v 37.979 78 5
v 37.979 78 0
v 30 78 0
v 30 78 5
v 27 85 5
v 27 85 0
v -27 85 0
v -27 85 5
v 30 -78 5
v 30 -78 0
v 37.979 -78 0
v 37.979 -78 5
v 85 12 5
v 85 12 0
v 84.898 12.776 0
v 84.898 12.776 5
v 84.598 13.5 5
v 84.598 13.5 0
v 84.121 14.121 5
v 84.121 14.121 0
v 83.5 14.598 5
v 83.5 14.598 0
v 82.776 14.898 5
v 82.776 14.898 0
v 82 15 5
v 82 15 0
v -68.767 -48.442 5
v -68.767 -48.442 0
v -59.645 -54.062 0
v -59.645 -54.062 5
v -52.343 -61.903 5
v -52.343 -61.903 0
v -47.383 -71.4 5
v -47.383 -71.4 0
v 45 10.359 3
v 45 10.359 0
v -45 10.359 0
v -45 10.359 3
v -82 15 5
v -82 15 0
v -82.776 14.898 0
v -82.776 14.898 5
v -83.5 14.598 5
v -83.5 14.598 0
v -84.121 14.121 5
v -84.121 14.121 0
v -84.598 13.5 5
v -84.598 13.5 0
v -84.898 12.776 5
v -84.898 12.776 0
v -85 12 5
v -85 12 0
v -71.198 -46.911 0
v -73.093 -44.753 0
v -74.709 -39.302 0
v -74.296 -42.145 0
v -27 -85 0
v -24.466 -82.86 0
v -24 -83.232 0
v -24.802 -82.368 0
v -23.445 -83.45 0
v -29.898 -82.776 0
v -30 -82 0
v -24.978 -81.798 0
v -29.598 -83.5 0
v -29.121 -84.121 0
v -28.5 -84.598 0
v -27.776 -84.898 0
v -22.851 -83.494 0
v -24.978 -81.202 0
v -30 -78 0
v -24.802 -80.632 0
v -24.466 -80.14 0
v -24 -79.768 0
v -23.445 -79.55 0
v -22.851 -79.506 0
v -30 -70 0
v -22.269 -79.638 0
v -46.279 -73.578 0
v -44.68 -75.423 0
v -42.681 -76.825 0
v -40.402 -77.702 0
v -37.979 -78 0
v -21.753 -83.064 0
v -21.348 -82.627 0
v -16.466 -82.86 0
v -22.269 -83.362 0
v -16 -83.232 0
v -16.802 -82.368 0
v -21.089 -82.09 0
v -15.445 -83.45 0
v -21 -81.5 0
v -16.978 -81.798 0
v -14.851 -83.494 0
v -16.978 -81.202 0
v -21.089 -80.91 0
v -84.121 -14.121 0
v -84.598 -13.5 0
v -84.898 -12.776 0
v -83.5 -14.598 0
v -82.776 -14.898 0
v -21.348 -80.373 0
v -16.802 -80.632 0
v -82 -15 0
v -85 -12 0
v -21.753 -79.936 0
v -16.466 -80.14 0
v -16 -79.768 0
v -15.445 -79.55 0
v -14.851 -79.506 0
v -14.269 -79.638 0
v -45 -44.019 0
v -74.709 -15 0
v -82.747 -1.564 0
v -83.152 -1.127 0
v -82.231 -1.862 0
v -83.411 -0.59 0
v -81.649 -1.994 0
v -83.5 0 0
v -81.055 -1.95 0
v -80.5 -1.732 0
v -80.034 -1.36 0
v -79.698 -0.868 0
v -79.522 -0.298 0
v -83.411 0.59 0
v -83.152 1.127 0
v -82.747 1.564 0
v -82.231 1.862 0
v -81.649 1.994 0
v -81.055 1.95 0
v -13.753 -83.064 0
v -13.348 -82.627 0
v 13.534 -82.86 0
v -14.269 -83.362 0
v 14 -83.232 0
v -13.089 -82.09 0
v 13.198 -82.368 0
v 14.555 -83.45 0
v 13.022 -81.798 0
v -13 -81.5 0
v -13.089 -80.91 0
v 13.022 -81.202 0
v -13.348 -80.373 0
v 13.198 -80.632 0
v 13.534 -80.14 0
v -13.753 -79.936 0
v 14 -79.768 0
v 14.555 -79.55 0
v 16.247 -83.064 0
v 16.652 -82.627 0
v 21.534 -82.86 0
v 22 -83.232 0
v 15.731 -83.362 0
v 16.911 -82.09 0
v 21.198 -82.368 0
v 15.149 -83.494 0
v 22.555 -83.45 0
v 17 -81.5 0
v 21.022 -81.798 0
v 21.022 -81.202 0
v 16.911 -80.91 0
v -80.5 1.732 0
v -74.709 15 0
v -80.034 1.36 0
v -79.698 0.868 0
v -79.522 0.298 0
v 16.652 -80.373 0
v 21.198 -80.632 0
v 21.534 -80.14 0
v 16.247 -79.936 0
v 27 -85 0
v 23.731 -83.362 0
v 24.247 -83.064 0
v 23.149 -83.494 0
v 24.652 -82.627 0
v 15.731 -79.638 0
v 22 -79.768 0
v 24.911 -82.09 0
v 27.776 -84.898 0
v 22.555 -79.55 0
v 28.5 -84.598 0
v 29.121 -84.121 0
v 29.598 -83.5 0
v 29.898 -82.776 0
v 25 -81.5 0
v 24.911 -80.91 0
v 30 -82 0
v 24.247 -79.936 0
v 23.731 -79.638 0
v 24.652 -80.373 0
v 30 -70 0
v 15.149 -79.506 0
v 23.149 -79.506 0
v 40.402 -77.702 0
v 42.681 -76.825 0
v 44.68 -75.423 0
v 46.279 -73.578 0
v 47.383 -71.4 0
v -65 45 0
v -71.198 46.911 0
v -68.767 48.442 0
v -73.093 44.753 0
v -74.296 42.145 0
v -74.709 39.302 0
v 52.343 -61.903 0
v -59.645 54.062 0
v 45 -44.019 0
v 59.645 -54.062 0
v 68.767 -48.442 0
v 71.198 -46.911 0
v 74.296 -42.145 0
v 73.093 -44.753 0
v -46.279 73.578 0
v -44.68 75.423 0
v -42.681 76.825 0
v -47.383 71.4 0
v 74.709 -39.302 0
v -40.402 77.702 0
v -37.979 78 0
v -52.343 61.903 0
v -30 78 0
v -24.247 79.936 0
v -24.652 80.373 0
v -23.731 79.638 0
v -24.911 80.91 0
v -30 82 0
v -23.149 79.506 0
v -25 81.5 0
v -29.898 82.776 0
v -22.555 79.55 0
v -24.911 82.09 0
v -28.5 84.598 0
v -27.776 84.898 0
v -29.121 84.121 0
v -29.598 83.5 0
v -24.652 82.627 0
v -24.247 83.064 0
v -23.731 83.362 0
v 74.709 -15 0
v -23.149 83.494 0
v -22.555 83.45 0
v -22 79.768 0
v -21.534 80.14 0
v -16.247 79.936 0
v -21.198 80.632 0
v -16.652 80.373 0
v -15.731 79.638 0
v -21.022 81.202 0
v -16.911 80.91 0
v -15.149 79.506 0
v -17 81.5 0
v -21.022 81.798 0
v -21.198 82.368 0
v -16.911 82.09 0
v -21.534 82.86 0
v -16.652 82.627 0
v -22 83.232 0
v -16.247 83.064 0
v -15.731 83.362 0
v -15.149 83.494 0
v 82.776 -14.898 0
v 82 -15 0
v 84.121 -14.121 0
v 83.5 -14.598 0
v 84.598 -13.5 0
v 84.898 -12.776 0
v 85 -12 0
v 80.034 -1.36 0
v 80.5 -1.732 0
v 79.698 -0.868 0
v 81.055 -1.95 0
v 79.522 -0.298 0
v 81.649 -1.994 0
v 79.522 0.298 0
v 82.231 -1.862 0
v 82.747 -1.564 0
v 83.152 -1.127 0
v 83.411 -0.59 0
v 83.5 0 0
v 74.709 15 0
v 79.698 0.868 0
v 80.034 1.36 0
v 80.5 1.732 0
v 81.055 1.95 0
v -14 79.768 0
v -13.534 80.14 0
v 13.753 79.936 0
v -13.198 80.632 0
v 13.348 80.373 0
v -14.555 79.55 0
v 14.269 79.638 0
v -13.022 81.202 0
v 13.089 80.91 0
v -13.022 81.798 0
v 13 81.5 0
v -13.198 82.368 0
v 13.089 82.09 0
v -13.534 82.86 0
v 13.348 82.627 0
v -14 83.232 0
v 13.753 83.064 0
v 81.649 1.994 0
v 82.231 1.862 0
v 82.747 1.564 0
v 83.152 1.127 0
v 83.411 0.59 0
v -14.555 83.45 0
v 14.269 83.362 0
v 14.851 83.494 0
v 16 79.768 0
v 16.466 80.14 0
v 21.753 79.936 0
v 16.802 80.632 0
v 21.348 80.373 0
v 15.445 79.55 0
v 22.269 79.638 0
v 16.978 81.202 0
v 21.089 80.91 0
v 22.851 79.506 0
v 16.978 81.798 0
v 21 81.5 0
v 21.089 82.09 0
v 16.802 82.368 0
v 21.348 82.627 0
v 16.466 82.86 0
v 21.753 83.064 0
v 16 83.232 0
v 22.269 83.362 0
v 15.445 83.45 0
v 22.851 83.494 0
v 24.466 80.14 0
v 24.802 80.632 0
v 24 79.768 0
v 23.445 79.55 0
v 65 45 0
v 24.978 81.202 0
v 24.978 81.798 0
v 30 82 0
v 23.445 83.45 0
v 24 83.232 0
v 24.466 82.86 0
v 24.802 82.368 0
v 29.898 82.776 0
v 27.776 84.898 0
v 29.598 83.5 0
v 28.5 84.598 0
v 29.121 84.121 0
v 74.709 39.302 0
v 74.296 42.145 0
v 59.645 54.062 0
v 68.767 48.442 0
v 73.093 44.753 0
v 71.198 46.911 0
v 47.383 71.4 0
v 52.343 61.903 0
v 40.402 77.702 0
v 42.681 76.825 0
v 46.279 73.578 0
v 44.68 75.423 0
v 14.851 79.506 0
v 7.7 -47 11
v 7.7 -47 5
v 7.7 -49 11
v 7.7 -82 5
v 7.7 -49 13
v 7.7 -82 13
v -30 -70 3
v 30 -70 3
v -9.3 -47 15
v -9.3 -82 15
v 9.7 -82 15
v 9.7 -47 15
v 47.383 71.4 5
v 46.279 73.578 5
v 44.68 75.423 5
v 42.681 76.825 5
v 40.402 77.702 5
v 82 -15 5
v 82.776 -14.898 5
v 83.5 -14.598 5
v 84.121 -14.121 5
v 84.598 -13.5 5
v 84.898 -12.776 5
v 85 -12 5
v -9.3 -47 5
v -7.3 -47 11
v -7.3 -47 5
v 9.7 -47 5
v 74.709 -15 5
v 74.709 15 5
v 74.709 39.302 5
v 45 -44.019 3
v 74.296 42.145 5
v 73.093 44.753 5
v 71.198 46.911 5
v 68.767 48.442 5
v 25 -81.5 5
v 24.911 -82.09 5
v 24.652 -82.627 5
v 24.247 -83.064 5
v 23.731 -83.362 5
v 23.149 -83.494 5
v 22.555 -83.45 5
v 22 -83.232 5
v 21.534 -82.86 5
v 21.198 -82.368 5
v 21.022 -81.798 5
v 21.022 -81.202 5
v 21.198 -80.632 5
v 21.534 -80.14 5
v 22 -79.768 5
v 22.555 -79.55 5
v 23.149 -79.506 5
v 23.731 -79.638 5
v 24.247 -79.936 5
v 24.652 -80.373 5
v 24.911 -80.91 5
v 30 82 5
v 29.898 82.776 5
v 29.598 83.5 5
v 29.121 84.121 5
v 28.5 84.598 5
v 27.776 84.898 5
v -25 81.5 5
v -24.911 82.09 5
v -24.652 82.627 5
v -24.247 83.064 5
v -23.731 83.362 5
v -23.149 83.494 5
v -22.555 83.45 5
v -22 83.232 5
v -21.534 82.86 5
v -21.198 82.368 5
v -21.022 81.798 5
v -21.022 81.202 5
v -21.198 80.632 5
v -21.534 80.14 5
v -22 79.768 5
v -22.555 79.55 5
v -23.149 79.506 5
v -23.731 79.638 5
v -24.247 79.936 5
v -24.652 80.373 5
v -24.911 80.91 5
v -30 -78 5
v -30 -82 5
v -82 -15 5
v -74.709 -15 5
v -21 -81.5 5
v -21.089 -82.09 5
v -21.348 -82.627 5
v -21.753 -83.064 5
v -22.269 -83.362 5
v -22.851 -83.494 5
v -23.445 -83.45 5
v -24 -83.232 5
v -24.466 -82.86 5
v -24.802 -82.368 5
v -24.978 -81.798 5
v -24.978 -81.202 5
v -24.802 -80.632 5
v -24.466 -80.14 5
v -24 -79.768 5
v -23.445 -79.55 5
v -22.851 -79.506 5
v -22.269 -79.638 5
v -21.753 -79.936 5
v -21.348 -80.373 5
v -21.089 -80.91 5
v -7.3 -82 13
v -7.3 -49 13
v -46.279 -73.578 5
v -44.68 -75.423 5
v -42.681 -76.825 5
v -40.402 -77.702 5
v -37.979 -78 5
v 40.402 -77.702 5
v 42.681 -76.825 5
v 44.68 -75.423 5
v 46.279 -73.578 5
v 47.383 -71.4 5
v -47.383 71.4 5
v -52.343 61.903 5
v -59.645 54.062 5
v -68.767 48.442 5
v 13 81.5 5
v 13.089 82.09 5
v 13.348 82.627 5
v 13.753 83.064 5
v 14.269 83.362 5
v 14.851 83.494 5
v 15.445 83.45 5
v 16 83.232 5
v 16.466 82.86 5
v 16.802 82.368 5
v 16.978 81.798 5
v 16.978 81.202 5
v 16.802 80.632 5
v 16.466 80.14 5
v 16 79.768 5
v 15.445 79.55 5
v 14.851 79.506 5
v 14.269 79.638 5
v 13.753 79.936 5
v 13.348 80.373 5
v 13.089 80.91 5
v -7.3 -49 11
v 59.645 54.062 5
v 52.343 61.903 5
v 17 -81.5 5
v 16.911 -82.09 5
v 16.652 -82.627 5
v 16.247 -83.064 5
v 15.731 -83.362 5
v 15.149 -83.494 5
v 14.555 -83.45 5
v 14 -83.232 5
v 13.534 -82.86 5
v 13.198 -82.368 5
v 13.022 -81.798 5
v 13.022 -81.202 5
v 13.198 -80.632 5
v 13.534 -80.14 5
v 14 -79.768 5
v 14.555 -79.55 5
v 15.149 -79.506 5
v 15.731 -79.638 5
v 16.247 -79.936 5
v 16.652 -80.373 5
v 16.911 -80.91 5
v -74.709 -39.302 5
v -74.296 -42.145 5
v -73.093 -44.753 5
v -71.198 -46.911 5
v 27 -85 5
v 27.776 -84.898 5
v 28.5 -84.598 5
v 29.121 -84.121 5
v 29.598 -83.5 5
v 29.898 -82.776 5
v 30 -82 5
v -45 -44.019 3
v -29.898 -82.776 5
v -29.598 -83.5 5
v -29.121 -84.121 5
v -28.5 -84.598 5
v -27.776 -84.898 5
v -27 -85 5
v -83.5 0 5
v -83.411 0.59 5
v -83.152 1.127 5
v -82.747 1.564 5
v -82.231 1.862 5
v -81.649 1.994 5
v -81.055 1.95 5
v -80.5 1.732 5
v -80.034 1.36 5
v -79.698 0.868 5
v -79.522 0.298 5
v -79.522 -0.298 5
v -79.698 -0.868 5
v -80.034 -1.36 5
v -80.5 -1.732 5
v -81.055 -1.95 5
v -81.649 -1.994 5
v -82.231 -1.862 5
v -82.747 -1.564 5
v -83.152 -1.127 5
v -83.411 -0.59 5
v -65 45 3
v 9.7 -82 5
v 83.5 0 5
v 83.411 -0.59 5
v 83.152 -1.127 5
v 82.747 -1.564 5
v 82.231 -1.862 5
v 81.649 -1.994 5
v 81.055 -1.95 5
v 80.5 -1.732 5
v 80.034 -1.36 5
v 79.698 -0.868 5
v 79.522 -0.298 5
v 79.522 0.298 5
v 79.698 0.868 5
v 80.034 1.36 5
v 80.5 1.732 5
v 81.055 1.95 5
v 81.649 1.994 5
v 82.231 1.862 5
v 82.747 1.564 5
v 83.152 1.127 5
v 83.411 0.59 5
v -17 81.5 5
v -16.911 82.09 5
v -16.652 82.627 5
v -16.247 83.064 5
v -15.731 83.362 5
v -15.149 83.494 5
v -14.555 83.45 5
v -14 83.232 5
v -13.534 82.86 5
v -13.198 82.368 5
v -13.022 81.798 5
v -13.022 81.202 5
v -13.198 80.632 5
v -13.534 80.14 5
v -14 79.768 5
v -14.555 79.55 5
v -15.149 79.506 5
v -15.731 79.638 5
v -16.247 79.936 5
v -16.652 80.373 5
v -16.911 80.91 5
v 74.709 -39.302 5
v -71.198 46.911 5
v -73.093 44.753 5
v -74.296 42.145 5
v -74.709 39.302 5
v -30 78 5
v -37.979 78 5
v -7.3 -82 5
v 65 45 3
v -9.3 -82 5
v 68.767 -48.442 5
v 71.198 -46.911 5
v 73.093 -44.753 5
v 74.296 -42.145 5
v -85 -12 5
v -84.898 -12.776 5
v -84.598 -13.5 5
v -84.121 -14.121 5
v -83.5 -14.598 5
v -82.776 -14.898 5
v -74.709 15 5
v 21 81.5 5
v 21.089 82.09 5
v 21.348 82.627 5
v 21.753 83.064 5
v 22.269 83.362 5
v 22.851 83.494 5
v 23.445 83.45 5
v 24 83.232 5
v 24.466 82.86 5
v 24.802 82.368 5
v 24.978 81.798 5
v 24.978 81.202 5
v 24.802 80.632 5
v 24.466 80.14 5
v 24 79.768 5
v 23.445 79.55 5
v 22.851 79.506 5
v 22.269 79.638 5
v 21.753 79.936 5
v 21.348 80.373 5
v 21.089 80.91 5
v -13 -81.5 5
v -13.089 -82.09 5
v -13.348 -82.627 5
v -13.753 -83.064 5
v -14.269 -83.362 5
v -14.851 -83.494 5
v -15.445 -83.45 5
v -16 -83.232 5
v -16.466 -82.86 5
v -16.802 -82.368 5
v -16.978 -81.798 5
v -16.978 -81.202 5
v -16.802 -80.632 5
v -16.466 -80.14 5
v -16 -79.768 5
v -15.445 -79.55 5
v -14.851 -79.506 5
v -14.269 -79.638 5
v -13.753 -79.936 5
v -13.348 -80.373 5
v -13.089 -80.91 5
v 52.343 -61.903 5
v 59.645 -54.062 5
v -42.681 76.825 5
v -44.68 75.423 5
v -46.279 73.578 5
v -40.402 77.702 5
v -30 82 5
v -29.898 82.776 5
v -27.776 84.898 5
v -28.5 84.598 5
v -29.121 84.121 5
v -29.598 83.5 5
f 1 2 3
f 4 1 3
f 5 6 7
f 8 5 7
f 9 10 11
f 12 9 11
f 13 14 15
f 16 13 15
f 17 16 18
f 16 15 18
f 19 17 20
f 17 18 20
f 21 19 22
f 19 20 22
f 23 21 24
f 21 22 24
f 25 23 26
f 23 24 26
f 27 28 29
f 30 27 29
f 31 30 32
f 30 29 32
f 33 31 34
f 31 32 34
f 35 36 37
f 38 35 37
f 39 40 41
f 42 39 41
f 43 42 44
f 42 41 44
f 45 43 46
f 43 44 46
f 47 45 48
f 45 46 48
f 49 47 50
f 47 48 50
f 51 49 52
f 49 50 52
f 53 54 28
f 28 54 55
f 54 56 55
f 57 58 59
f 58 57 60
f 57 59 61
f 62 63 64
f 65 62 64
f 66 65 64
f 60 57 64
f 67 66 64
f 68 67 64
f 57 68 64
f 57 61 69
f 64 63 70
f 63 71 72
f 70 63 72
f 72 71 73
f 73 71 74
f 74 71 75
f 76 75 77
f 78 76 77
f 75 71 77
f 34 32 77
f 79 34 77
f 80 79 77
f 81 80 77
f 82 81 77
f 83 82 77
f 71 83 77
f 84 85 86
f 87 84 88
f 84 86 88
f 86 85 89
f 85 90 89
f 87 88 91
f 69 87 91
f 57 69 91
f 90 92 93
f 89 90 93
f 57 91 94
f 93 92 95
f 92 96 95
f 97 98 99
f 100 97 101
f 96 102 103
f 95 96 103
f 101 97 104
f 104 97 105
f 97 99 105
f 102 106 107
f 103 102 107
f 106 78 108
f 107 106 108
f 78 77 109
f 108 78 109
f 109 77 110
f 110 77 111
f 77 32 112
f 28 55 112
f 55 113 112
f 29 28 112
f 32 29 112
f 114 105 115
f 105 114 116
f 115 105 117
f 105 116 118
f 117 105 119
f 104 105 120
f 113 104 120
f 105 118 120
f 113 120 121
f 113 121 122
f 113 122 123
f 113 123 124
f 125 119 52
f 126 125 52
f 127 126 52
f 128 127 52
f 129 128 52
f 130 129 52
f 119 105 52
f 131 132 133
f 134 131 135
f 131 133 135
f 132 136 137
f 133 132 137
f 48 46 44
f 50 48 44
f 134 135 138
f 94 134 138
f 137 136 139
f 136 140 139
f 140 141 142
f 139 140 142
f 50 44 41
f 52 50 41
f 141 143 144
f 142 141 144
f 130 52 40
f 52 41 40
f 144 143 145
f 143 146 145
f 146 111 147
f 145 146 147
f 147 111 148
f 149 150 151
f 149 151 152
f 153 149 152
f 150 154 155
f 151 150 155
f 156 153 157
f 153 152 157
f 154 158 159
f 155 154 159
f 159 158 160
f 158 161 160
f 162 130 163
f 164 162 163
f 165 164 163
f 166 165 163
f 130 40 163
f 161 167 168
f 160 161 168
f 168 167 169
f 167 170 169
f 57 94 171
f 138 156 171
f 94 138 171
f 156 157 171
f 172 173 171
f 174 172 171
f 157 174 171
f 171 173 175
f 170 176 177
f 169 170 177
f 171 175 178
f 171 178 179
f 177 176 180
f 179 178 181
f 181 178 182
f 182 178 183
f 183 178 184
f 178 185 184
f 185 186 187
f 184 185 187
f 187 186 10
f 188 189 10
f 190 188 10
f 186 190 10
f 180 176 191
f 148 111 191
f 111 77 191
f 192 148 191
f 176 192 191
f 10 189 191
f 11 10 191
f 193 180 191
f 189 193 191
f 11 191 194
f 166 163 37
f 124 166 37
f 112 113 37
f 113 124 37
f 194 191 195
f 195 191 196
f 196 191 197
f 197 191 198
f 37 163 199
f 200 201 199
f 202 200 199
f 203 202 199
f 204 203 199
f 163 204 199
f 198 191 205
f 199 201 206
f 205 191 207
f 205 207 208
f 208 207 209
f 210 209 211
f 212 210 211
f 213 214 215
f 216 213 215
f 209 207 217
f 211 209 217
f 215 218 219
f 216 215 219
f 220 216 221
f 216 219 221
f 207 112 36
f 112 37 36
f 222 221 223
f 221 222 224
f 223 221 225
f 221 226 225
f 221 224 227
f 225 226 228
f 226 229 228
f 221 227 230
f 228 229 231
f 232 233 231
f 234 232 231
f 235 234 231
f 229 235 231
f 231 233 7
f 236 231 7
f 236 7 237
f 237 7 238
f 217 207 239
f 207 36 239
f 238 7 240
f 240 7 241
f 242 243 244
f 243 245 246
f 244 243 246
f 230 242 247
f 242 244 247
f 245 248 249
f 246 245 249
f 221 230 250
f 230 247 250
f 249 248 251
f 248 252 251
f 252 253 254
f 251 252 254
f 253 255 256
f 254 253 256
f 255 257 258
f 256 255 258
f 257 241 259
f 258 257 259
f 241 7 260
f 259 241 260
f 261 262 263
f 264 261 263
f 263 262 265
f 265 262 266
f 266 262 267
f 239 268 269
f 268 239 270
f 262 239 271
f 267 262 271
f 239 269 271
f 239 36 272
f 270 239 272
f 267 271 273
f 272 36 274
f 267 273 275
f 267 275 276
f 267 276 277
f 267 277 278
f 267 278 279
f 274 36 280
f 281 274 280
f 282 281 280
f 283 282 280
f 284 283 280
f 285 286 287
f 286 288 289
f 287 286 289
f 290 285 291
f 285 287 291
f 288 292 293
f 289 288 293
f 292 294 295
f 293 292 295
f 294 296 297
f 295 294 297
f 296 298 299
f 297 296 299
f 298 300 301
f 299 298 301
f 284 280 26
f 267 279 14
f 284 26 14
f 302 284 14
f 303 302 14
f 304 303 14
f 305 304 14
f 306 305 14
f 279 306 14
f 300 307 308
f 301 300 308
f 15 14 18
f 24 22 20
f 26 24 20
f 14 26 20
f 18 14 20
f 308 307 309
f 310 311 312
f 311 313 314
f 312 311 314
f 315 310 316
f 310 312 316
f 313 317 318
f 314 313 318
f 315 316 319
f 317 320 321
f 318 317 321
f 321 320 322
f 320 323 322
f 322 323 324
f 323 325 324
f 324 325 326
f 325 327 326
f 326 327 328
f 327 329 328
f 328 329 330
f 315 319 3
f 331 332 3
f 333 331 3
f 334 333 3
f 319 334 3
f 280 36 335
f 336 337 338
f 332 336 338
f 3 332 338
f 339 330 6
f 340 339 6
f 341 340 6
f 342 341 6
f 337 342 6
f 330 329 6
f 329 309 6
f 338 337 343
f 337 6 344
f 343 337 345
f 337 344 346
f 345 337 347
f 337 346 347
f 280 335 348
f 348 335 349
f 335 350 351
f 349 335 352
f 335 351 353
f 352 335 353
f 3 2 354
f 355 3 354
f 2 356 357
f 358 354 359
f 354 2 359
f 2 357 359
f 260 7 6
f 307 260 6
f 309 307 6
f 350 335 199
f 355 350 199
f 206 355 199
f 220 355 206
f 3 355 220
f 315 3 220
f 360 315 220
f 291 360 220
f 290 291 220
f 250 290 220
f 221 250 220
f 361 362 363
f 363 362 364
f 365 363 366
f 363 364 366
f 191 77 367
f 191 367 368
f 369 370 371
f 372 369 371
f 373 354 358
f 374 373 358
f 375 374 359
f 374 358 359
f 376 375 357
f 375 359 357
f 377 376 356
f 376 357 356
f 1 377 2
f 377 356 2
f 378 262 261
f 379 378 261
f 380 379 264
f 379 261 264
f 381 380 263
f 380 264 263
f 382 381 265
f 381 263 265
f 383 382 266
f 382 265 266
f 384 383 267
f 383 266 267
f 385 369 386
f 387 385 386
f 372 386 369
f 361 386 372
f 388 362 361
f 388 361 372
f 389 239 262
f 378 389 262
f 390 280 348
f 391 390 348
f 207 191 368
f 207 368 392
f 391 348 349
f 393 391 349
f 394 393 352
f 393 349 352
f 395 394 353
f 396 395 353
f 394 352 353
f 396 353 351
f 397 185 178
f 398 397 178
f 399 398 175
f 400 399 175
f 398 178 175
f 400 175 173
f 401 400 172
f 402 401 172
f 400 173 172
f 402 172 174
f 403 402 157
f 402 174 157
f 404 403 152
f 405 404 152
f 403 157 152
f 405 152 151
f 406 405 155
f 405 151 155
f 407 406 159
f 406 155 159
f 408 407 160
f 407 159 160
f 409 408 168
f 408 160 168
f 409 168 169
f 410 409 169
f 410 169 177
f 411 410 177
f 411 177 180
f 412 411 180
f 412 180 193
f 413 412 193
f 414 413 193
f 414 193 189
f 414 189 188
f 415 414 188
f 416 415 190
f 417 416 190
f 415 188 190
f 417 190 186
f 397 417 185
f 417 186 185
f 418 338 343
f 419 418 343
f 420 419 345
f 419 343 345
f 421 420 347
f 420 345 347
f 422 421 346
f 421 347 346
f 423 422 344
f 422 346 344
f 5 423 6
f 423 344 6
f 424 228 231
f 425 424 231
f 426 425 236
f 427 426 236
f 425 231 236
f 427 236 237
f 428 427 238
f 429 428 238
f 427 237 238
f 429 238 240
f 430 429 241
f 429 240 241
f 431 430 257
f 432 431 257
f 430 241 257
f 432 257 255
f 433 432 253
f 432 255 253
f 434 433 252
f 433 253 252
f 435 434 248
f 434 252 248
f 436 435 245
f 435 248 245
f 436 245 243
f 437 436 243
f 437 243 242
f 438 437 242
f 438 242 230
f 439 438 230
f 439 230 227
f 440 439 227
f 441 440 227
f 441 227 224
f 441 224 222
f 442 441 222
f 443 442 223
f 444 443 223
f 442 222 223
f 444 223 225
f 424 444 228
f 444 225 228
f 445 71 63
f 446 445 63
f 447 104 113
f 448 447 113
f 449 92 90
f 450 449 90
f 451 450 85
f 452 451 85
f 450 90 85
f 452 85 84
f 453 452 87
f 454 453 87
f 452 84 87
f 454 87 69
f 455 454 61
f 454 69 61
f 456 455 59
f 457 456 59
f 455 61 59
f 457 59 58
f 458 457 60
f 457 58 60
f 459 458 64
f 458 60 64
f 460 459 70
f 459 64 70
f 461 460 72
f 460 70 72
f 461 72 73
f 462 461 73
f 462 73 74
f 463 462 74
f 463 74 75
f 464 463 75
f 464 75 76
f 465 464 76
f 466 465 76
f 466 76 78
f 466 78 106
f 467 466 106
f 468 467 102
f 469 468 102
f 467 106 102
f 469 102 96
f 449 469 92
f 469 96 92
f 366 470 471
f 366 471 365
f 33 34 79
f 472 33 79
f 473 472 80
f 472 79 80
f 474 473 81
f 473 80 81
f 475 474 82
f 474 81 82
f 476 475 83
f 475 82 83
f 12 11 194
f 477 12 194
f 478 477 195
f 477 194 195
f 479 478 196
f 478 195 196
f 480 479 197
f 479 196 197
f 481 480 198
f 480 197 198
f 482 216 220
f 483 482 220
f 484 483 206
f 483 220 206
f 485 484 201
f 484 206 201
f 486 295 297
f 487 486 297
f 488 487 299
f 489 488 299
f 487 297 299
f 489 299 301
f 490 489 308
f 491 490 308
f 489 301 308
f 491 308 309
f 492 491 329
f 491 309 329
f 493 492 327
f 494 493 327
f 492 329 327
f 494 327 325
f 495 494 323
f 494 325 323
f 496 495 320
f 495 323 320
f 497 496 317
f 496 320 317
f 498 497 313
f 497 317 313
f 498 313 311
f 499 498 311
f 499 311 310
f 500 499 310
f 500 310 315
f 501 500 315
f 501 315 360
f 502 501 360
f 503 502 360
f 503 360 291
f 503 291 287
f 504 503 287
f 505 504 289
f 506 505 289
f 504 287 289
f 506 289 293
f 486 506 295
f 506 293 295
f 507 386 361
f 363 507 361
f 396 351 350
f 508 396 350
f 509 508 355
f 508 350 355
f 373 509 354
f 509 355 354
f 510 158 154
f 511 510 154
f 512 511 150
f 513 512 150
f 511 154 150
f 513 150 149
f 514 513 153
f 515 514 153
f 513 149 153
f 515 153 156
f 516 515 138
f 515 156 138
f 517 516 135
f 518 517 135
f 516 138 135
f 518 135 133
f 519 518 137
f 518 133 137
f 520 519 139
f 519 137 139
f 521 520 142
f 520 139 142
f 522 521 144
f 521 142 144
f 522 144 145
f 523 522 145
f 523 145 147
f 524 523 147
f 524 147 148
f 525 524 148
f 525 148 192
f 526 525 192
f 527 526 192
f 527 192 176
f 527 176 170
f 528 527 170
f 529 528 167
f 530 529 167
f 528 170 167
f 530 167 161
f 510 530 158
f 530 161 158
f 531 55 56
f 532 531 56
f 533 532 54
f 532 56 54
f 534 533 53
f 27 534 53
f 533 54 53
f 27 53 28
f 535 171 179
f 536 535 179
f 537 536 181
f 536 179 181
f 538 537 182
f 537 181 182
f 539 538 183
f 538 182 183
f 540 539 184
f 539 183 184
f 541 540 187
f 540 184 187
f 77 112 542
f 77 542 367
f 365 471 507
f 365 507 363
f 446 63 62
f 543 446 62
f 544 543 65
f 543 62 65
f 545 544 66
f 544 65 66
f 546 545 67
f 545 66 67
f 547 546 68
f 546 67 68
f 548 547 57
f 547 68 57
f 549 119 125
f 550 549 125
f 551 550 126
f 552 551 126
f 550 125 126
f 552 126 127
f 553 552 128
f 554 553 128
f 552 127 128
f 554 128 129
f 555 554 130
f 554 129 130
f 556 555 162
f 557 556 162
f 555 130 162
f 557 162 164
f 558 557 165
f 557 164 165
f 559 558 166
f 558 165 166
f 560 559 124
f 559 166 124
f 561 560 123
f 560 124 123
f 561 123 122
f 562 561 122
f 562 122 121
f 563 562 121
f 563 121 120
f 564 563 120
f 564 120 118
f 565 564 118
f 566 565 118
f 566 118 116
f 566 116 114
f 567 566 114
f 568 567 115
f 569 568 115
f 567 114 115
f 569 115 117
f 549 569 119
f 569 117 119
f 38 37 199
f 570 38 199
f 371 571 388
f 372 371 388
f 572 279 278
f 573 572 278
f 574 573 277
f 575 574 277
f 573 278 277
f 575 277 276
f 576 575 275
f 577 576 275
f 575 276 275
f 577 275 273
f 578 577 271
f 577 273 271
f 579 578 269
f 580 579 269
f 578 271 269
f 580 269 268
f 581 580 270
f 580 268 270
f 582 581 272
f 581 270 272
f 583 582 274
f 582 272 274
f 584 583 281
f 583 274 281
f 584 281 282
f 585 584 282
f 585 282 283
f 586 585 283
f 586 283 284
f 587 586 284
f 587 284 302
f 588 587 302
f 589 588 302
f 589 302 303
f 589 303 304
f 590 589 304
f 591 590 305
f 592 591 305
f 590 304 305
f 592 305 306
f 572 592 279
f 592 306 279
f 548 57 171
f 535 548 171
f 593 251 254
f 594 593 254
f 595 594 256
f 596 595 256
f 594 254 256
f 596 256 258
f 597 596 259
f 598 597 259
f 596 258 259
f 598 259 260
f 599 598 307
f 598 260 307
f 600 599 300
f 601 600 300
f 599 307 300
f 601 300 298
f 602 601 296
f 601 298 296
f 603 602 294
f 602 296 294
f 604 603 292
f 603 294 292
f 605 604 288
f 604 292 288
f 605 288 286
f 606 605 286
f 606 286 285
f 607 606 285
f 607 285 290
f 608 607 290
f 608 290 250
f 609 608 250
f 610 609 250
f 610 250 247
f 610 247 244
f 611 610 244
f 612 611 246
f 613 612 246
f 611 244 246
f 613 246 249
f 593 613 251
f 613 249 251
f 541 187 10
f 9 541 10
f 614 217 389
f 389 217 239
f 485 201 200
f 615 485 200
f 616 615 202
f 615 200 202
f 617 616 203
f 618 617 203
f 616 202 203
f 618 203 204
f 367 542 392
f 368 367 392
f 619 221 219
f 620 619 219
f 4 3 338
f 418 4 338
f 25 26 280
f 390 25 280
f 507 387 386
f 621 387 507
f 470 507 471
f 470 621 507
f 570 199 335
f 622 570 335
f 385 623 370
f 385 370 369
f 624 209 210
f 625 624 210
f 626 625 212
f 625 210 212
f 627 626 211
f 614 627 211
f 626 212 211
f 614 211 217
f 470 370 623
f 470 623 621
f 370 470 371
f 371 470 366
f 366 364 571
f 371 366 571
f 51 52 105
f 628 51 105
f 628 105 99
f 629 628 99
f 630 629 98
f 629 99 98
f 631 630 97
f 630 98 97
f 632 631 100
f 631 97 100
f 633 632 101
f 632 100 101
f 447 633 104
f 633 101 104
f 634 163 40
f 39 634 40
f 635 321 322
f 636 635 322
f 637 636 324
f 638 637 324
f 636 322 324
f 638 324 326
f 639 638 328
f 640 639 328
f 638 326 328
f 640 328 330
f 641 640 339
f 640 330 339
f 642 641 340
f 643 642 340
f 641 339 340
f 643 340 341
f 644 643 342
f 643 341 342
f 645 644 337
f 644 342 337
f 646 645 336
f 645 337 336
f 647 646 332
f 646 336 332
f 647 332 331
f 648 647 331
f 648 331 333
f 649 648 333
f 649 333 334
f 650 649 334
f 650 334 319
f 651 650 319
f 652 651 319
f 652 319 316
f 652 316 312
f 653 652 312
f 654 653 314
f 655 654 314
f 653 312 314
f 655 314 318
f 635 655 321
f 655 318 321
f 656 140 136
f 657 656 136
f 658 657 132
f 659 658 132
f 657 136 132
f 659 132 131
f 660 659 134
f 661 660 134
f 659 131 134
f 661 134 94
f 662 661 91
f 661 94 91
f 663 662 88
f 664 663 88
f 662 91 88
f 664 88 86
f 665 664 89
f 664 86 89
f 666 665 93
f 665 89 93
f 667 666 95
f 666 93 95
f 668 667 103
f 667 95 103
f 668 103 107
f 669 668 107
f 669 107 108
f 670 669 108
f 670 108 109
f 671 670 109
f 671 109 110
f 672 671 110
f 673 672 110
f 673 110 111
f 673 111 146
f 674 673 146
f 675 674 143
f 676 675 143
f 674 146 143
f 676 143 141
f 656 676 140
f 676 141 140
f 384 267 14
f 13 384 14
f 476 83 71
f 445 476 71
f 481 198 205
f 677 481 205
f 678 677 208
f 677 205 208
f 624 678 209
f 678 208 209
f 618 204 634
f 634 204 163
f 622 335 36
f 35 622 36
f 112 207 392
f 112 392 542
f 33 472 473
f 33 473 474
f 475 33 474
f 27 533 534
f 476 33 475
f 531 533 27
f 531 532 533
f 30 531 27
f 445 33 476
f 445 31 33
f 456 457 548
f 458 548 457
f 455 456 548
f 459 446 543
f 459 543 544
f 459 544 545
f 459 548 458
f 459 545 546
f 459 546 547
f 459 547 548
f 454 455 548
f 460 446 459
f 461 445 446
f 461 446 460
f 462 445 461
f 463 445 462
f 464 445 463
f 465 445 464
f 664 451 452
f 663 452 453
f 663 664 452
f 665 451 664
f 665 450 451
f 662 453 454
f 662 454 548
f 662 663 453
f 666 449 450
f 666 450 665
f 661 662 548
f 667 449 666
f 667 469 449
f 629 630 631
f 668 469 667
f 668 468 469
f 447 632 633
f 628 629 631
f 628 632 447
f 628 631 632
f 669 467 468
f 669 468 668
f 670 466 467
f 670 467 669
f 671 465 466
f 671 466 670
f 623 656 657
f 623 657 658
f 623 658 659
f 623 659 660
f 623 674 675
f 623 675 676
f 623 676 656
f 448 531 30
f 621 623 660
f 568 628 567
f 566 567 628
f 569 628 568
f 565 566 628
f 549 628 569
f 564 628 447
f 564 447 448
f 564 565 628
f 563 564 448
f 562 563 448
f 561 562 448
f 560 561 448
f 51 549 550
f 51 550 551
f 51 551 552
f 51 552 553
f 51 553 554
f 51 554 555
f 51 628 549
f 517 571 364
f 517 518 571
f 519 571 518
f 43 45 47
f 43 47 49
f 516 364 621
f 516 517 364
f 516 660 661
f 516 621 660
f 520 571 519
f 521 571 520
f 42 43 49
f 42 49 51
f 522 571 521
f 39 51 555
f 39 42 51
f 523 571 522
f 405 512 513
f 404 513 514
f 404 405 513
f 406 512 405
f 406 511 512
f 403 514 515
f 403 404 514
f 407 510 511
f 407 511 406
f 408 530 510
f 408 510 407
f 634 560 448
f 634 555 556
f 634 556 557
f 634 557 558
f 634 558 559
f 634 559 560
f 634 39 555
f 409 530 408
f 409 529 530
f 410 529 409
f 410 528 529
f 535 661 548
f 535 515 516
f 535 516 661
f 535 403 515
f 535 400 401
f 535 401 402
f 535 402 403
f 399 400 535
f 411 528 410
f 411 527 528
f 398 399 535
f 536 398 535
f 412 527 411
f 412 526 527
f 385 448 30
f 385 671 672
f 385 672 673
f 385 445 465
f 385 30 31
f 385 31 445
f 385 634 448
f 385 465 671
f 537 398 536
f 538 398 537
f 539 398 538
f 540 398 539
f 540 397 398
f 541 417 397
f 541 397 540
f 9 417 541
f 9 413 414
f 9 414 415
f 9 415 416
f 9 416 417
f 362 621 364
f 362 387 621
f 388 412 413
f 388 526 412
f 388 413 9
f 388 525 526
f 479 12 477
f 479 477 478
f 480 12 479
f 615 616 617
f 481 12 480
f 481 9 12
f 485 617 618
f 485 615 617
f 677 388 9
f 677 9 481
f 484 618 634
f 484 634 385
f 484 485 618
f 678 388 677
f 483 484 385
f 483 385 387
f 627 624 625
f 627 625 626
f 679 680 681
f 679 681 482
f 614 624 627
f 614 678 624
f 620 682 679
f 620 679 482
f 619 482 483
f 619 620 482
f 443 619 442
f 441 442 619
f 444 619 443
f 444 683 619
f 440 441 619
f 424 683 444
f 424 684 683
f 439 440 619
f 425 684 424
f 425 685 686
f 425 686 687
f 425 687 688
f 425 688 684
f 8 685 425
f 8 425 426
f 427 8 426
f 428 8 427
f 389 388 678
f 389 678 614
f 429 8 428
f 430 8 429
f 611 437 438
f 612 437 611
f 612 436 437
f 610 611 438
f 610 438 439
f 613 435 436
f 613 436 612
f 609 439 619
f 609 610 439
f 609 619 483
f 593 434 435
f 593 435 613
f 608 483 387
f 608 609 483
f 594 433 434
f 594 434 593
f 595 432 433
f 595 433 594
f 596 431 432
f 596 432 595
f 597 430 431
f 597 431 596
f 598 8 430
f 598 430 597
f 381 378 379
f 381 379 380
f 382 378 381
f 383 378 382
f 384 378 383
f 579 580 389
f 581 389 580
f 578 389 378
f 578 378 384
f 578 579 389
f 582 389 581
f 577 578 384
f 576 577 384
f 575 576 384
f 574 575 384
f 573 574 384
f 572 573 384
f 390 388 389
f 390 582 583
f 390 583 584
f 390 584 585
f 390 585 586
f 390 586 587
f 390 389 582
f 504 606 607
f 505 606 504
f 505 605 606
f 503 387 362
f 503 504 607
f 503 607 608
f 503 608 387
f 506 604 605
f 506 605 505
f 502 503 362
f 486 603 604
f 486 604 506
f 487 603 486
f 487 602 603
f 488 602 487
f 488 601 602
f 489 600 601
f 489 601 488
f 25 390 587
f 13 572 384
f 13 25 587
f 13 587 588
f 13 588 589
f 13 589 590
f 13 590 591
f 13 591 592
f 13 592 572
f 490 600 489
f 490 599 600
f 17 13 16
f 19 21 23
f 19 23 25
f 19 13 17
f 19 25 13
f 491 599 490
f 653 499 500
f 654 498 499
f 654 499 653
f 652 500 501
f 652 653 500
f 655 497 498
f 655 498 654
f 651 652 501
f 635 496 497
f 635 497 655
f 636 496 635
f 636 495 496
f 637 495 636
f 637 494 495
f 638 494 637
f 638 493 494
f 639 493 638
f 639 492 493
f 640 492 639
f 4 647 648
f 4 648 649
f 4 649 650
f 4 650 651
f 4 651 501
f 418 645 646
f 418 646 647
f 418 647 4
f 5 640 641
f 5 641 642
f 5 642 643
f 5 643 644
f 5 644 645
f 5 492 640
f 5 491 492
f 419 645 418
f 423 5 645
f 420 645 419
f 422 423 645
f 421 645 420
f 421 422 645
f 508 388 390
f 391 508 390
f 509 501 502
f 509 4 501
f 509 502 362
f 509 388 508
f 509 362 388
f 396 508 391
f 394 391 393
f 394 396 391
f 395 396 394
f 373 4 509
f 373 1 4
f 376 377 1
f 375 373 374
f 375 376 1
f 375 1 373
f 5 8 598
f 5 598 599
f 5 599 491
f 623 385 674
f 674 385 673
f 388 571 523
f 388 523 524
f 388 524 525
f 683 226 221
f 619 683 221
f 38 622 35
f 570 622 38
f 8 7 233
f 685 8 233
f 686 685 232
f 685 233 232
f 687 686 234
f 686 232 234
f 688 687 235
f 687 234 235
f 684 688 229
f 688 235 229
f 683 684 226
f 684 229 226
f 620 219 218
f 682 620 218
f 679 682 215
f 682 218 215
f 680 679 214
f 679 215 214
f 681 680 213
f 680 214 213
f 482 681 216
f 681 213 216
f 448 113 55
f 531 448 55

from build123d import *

# Parameters (mm, degrees)
BOSS_EXTRUDE1_DEPTH = 5
SKETCH2_R           = 2
CUT_EXTRUDE1_DEPTH  = 5
CUT_EXTRUDE2_DEPTH  = 3
SKETCH4_W           = 19
SKETCH4_H           = 35
BOSS_EXTRUDE2_DEPTH = 10
SKETCH6_W           = 15
SKETCH6_H           = 8
CUT_EXTRUDE4_DEPTH  = 33
SKETCH7_W           = 15
SKETCH7_H           = 6
CUT_EXTRUDE5_DEPTH  = 2


with BuildPart() as part:
    # Sketch1 → Boss-Extrude1 (new body)
    with BuildSketch(Plane.XY):
        with BuildLine():
            Line((82, 15), (74.70882917, 15))
            Line((74.70882917, 15), (74.70882917, 39.302424721))
            ThreePointArc((74.70882917, 39.302424721), (73.092812163, 44.753005348), (68.767063336, 48.441939777))
            ThreePointArc((68.767063336, 48.441939777), (55.730177295, 57.736884279), (47.382982574, 71.4))
            ThreePointArc((47.382982574, 71.4), (43.723290865, 76.185352772), (37.978728218, 78))
            Line((37.978728218, 78), (30, 78))
            Line((30, 78), (30, 82))
            ThreePointArc((30, 82), (29.121320344, 84.121320344), (27, 85))
            Line((27, 85), (-27, 85))
            ThreePointArc((-27, 85), (-29.121320344, 84.121320344), (-30, 82))
            Line((-30, 82), (-30, 78))
            Line((-30, 78), (-37.978728218, 78))
            ThreePointArc((-37.978728218, 78), (-43.723290865, 76.185352772), (-47.382982574, 71.4))
            ThreePointArc((-47.382982574, 71.4), (-55.730177295, 57.736884279), (-68.767063336, 48.441939777))
            ThreePointArc((-68.767063336, 48.441939777), (-73.092812163, 44.753005348), (-74.70882917, 39.302424721))
            Line((-74.70882917, 39.302424721), (-74.70882917, 15))
            Line((-74.70882917, 15), (-82, 15))
            ThreePointArc((-82, 15), (-84.121320344, 14.121320344), (-85, 12))
            Line((-85, 12), (-85, -12))
            ThreePointArc((-85, -12), (-84.121320344, -14.121320344), (-82, -15))
            Line((-82, -15), (-74.70882917, -15))
            Line((-74.70882917, -15), (-74.70882917, -39.302424721))
            ThreePointArc((-74.70882917, -39.302424721), (-73.092812163, -44.753005348), (-68.767063336, -48.441939777))
            ThreePointArc((-68.767063336, -48.441939777), (-55.730177295, -57.736884279), (-47.382982574, -71.4))
            ThreePointArc((-47.382982574, -71.4), (-43.723290865, -76.185352772), (-37.978728218, -78))
            Line((-37.978728218, -78), (-30, -78))
            Line((-30, -78), (-30, -82))
            ThreePointArc((-30, -82), (-29.121320344, -84.121320344), (-27, -85))
            Line((-27, -85), (27, -85))
            ThreePointArc((27, -85), (29.121320344, -84.121320344), (30, -82))
            Line((30, -82), (30, -78))
            Line((30, -78), (37.978728218, -78))
            ThreePointArc((37.978728218, -78), (43.723290865, -76.185352772), (47.382982574, -71.4))
            ThreePointArc((47.382982574, -71.4), (55.730177295, -57.736884279), (68.767063336, -48.441939777))
            ThreePointArc((68.767063336, -48.441939777), (73.092812163, -44.753005348), (74.70882917, -39.302424721))
            Line((74.70882917, -39.302424721), (74.70882917, -15))
            Line((74.70882917, -15), (82, -15))
            ThreePointArc((82, -15), (84.121320344, -14.121320344), (85, -12))
            Line((85, -12), (85, 12))
            ThreePointArc((85, 12), (84.121320344, 14.121320344), (82, 15))
        make_face()
    extrude(amount=BOSS_EXTRUDE1_DEPTH)

    # Sketch2 → Cut-Extrude1 (cut)
    with BuildSketch(Plane(origin=(0, 0, 0), x_dir=(-1, 0, 0), z_dir=(0, 0, -1))):
        with Locations((81.5, 0)):
            Circle(SKETCH2_R)
        with Locations(Location((-81.5, 0, 0), (0, 0, 180))):
            Circle(SKETCH2_R)
        with Locations((-23, 81.5)):
            Circle(SKETCH2_R)
        with Locations((15, 81.5)):
            Circle(SKETCH2_R)
        with Locations((23, 81.5)):
            Circle(SKETCH2_R)
        with Locations((-15, 81.5)):
            Circle(SKETCH2_R)
        with Locations(Location((-23, -81.5, 0), (0, 0, 180))):
            Circle(SKETCH2_R)
        with Locations(Location((-15, -81.5, 0), (0, 0, 180))):
            Circle(SKETCH2_R)
        with Locations(Location((15, -81.5, 0), (0, 0, 180))):
            Circle(SKETCH2_R)
        with Locations(Location((23, -81.5, 0), (0, 0, 180))):
            Circle(SKETCH2_R)
    extrude(amount=-CUT_EXTRUDE1_DEPTH, mode=Mode.SUBTRACT)

    # Sketch3 → Cut-Extrude2 (cut)
    with BuildSketch(Plane(origin=(0, 0, 0), x_dir=(-1, 0, 0), z_dir=(0, 0, -1))):
        Polygon((-30, -70), (-45, -44.019237886), (45, -44.019237886), (30, -70), align=None)
        Polygon((65, 45), (-65, 45), (-45, 10.358983849), (45, 10.358983849), align=None)
    extrude(amount=-CUT_EXTRUDE2_DEPTH, mode=Mode.SUBTRACT)

    # Sketch4 → Boss-Extrude2 (add)
    with BuildSketch(Plane.XY.offset(5)):
        with Locations((0.2, -64.5)):
            Rectangle(SKETCH4_W, SKETCH4_H)
    extrude(amount=BOSS_EXTRUDE2_DEPTH)

    # Sketch6 → Cut-Extrude4 (cut)
    with BuildSketch(Plane.XZ.offset(82)):
        with Locations((0.2, 9)):
            Rectangle(SKETCH6_W, SKETCH6_H)
    extrude(amount=-CUT_EXTRUDE4_DEPTH, mode=Mode.SUBTRACT)

    # Sketch7 → Cut-Extrude5 (cut)
    with BuildSketch(Plane(origin=(0, -47, 0), x_dir=(1, 0, 0), z_dir=(0, 1, 0))):
        with Locations((0.2, -8)):
            Rectangle(SKETCH7_W, SKETCH7_H)
    extrude(amount=-CUT_EXTRUDE5_DEPTH, mode=Mode.SUBTRACT)


solid = part.part
